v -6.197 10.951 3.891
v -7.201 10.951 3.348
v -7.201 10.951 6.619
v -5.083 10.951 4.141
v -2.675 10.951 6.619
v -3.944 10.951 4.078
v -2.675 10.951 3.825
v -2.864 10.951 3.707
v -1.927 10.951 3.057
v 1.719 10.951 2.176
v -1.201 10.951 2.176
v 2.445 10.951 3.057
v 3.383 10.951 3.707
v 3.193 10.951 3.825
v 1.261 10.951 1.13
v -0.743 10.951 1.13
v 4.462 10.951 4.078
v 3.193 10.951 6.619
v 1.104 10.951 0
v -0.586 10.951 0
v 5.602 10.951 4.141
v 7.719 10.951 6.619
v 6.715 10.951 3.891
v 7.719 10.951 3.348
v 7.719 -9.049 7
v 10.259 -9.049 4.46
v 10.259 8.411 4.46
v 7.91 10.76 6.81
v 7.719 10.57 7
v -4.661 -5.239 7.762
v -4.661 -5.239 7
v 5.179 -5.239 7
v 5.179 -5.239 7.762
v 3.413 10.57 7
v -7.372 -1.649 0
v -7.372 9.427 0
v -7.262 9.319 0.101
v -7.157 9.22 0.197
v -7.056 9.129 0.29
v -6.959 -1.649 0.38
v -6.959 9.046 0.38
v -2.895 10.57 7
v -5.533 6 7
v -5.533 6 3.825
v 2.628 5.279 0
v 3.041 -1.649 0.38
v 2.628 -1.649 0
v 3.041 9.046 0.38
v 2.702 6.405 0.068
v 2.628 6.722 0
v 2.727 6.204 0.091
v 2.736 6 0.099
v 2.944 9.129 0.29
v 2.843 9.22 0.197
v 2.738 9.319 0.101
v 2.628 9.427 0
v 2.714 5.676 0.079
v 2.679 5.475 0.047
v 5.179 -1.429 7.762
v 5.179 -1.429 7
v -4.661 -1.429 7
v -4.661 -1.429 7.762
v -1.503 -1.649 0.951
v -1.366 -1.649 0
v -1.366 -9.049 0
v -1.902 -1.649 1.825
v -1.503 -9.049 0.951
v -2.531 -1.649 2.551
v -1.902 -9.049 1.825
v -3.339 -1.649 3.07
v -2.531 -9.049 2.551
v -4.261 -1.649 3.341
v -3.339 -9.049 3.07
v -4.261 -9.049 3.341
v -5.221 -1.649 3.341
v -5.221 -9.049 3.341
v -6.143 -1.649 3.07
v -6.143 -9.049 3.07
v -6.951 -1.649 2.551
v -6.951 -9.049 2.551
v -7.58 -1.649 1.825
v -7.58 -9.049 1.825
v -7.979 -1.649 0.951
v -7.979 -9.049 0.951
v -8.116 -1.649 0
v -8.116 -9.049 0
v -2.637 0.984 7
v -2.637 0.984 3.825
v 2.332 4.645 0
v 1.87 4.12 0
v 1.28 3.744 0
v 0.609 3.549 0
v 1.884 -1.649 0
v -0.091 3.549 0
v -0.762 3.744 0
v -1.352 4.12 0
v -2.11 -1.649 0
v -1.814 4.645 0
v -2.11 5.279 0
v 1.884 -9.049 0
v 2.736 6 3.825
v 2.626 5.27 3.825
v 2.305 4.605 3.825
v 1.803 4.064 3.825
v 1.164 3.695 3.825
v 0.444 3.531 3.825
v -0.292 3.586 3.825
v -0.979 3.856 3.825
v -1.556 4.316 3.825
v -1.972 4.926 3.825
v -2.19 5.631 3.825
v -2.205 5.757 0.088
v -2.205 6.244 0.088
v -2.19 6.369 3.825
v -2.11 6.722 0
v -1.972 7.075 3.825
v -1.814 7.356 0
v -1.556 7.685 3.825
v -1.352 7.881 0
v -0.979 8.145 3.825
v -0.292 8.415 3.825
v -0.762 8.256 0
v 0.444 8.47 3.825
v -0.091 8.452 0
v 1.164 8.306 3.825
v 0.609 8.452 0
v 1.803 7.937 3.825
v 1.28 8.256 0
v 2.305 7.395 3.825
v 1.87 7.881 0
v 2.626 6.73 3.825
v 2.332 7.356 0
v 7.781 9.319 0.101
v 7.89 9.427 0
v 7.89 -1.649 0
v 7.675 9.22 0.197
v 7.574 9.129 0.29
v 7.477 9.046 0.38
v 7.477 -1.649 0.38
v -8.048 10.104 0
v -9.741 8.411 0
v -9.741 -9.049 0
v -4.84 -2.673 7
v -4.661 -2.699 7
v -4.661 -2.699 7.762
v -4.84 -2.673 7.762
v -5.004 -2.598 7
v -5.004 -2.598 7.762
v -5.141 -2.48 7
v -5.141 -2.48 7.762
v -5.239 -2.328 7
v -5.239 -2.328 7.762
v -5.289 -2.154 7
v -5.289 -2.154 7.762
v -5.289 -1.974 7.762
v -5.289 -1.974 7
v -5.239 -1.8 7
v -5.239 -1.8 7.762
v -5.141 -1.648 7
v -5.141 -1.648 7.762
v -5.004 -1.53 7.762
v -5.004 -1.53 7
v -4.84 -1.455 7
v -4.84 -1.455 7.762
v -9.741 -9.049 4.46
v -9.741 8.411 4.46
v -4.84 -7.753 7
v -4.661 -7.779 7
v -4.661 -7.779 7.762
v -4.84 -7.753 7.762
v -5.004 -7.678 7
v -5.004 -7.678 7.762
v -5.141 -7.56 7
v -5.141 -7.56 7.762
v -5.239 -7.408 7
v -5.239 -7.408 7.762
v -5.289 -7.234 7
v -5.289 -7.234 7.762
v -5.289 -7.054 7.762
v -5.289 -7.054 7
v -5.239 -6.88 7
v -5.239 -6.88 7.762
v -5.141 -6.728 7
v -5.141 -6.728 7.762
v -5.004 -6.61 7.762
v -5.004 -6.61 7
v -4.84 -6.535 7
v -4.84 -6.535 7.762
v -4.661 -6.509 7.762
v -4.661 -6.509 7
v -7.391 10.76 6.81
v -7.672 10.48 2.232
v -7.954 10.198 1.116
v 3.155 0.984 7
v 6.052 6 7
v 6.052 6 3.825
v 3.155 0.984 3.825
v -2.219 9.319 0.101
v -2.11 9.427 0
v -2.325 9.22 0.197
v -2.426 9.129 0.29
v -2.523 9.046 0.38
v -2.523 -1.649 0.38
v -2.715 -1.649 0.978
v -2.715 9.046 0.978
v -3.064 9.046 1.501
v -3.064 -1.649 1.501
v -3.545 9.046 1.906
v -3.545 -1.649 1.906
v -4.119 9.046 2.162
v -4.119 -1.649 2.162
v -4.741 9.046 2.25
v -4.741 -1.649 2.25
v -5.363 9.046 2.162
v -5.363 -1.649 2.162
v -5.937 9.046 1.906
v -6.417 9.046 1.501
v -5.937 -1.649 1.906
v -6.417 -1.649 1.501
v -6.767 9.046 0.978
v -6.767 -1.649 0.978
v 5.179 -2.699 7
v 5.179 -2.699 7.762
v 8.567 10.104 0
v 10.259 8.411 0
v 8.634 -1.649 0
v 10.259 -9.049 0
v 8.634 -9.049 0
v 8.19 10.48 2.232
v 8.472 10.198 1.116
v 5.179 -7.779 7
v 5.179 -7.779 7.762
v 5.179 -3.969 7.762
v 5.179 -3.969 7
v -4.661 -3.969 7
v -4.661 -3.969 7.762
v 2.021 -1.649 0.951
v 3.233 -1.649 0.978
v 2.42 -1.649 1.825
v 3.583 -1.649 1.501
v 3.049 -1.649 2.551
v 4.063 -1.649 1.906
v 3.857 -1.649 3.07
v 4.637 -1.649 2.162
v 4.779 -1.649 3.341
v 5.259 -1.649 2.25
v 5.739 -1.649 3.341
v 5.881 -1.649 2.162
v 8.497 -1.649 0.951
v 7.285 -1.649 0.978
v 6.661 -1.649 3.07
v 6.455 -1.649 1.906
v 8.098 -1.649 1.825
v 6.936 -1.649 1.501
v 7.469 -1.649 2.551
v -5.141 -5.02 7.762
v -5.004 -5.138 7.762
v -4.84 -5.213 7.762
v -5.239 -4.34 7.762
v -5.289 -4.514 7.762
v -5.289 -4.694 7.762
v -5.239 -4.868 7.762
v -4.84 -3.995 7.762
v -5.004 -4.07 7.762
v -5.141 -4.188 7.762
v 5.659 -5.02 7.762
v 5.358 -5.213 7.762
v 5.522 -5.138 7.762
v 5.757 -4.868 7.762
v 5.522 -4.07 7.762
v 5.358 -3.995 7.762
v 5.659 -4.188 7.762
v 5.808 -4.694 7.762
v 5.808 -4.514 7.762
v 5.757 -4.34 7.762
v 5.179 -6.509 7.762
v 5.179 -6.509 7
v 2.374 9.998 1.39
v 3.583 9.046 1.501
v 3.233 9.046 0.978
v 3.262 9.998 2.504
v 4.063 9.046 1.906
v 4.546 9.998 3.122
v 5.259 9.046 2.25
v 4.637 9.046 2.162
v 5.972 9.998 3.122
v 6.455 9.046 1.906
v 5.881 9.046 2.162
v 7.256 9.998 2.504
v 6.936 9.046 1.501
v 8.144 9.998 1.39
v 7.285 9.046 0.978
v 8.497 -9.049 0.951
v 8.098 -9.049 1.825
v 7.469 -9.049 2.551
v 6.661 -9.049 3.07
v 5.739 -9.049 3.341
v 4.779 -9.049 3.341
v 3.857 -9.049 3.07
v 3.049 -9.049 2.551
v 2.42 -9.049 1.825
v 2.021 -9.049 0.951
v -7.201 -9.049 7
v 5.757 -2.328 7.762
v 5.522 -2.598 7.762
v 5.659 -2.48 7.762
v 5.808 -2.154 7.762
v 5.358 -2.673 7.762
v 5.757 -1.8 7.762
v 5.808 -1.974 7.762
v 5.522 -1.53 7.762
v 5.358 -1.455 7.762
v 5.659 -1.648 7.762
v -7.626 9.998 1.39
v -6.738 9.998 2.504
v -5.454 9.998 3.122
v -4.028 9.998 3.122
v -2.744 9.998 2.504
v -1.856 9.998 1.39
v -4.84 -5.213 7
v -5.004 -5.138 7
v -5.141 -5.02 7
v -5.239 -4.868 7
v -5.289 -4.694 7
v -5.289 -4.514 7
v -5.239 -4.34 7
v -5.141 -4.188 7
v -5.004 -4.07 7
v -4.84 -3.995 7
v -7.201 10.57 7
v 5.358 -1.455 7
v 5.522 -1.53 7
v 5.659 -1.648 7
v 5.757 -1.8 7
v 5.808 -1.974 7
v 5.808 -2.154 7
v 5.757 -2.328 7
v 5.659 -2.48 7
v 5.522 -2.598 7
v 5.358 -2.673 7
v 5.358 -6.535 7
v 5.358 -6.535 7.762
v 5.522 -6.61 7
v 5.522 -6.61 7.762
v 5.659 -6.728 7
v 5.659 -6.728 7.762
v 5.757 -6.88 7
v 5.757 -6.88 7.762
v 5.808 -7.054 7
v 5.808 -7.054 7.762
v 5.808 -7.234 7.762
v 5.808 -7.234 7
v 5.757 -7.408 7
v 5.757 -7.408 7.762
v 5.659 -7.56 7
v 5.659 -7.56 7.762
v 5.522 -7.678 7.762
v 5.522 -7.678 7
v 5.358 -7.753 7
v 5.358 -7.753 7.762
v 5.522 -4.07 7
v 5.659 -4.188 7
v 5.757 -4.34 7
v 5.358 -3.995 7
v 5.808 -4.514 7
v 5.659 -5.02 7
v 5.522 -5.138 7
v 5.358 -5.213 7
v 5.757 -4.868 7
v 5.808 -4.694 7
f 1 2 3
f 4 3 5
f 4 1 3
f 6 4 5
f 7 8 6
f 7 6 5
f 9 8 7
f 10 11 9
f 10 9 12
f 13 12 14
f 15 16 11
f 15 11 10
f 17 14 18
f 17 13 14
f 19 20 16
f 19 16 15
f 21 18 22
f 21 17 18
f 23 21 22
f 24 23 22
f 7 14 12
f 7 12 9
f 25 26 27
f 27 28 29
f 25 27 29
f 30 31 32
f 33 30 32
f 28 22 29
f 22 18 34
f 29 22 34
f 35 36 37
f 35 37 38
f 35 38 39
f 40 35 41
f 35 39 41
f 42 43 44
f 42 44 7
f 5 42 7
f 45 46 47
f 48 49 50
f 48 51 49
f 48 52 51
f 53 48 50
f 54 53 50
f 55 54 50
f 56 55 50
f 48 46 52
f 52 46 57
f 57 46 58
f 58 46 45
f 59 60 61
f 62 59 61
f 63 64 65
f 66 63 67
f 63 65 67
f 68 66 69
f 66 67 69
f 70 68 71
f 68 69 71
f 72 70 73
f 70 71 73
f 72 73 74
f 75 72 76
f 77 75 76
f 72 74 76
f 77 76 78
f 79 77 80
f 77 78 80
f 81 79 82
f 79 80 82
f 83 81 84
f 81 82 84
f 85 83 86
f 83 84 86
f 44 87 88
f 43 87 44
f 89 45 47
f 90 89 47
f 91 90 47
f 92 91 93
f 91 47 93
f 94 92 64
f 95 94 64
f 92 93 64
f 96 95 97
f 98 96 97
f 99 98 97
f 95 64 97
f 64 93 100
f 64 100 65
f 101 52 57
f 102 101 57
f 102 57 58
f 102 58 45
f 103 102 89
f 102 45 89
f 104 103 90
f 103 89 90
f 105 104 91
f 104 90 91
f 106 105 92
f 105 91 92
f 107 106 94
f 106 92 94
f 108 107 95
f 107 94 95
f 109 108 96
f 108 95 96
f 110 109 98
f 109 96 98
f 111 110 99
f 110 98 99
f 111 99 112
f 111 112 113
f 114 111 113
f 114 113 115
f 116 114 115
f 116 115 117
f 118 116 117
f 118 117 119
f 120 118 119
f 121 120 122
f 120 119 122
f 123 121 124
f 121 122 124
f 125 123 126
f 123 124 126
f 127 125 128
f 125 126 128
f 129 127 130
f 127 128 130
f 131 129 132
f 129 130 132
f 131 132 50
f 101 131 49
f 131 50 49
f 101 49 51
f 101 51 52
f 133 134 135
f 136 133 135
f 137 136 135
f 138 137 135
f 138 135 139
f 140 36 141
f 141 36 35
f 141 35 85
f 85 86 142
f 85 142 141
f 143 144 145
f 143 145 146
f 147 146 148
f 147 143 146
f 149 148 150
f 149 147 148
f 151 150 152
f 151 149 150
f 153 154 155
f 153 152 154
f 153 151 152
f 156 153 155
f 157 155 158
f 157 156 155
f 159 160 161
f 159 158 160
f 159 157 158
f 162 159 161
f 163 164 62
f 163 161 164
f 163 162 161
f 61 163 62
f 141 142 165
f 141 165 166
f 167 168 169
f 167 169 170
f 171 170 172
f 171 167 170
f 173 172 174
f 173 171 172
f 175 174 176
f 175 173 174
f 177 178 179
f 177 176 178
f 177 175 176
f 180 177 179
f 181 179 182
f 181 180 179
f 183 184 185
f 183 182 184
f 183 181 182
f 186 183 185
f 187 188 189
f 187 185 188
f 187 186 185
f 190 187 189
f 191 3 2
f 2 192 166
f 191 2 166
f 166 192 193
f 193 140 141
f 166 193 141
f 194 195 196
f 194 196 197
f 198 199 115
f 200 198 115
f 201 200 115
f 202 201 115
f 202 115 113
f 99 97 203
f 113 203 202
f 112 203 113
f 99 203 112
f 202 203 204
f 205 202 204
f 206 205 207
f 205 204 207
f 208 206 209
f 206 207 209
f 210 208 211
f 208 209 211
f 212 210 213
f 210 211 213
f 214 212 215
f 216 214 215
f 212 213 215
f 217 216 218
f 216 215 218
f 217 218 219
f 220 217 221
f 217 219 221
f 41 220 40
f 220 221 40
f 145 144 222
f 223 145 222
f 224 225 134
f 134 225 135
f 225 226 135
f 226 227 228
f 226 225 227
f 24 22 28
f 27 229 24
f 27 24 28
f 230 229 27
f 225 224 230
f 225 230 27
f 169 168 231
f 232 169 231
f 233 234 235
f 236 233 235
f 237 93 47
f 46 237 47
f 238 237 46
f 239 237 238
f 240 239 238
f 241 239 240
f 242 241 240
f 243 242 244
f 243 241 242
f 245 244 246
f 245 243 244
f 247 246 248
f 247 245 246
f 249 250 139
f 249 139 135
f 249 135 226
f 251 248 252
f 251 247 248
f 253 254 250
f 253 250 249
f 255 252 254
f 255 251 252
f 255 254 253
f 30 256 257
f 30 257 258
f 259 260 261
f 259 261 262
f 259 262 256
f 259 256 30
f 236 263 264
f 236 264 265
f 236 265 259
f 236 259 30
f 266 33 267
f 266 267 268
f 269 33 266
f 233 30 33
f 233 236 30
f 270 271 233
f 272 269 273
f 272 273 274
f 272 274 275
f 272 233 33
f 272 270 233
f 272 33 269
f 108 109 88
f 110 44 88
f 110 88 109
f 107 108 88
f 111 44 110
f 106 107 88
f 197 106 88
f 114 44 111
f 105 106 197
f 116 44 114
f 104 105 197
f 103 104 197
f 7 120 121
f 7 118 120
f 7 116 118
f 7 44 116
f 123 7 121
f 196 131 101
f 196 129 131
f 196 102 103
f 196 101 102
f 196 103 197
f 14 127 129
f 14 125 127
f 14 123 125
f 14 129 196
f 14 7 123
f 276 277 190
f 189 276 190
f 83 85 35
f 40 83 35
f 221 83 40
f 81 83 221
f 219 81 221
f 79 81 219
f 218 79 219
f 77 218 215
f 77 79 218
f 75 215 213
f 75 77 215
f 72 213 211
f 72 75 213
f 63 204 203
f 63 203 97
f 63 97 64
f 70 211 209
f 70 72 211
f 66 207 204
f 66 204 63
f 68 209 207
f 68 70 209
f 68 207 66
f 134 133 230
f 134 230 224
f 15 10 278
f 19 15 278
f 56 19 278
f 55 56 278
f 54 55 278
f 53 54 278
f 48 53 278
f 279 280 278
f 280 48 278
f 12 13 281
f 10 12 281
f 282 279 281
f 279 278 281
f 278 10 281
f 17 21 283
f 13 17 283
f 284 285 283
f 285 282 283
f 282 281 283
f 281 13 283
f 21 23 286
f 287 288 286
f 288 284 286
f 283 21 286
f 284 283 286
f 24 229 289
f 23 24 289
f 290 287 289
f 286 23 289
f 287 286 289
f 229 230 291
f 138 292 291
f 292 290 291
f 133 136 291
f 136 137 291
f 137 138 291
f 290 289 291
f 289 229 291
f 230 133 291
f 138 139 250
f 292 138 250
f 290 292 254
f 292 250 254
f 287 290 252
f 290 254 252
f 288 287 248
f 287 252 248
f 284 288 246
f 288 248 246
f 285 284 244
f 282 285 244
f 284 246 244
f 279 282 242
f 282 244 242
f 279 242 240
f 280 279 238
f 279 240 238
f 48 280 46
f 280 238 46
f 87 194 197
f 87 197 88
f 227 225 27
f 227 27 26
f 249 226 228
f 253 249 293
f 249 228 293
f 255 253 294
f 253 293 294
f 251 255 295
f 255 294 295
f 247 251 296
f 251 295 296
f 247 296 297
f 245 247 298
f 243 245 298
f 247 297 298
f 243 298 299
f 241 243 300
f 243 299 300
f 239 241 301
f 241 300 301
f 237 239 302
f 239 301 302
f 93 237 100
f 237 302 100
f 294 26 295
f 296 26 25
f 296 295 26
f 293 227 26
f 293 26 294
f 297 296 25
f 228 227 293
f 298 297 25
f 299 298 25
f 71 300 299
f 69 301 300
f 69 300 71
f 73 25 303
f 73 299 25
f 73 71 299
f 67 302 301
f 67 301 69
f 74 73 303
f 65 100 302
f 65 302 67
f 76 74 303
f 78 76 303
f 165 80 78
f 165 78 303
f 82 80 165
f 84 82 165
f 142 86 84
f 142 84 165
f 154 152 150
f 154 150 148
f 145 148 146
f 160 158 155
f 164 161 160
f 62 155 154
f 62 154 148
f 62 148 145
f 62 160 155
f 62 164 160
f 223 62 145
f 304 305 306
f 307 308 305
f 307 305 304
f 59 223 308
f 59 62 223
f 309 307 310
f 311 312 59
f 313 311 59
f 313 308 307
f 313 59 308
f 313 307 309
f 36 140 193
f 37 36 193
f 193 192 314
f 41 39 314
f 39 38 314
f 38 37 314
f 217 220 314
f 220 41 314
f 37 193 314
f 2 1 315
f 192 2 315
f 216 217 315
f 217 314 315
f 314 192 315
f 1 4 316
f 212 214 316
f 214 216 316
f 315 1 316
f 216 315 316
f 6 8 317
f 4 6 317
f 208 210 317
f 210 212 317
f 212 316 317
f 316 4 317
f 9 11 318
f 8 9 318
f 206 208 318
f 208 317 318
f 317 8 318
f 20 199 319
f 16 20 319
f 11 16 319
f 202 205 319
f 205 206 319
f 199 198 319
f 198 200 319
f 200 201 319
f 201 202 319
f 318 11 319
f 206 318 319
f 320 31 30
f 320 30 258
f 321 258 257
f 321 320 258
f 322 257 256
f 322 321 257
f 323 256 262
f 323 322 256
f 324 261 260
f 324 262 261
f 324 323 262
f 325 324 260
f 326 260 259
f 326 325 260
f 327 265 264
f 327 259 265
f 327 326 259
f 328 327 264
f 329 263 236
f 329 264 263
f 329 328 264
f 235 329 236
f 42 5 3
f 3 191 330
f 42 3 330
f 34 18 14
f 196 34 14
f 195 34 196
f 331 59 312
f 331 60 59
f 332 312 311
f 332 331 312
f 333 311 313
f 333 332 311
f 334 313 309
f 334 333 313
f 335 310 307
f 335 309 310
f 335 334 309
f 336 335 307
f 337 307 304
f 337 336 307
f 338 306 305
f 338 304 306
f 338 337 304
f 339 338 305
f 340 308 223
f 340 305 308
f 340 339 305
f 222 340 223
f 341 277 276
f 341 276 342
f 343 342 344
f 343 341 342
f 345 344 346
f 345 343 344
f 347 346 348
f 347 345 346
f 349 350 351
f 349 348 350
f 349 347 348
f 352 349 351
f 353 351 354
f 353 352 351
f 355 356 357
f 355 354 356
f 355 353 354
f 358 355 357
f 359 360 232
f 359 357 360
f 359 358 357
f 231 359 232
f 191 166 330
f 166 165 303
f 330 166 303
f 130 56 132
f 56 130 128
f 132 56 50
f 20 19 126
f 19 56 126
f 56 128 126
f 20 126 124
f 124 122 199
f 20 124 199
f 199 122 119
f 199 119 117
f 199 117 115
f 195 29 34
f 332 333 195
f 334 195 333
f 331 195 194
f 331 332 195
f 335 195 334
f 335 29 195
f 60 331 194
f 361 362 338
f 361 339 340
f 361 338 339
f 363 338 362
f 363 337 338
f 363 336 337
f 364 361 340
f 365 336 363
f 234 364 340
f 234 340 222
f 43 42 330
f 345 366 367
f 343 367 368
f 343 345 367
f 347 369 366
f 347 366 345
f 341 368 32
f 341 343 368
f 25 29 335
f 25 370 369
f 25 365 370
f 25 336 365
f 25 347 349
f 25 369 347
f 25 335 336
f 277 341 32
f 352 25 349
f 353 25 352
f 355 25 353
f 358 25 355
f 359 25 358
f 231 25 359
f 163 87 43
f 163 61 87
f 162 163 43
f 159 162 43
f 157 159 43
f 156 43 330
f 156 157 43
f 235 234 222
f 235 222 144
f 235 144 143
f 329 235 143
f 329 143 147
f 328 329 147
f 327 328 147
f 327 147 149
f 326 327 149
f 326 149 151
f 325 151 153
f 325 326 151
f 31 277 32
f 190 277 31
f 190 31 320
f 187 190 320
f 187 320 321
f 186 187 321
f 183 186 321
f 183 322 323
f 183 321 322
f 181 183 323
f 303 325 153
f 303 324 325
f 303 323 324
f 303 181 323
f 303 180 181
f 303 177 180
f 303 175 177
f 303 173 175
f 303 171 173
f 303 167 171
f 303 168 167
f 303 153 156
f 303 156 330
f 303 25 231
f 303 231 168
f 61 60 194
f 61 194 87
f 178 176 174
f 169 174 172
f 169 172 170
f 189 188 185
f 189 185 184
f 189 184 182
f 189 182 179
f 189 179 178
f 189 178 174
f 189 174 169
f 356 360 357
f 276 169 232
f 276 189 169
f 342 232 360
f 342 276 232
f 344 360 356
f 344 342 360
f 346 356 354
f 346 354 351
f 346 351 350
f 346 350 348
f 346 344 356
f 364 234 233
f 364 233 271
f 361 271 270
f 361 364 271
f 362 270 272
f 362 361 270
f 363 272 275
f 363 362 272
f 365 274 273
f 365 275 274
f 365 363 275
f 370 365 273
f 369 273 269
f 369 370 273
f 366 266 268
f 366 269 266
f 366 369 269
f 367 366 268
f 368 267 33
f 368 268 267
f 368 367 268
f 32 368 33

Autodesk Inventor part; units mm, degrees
ref_plane "YZ Plane" through (0, 0, 0) normal (1, 0, 0) x (0, 1, 0)
ref_plane "XZ Plane" through (0, 0, 0) normal (0, 1, 0) x (-1, 0, 0)
ref_plane "XY Plane" through (0, 0, 0) normal (0, 0, 1) x (1, 0, 0)
sketch "Sketch1" plane through (0, 0, 0) normal (0, 1, 0) x (-1, 0, 0)
  line L0 (-10.2591, 9.049) -> (9.7409, 9.049)
  line L1 (9.7409, 9.049) -> (9.7409, -10.951)
  line L2 (9.7409, -10.951) -> (-10.2591, -10.951)
  line L3 (-10.2591, -10.951) -> (-10.2591, 9.049)
  point P0 (0, 0)
  dimension "d0" = 20
  dimension "d1" = 20
extrude "Extrusion1" add sketch "Sketch1" along normal blind 7
sketch "Sketch2" plane through (-9.7409, 0, 9.049) normal (0, 0, 1) x (1, 0, 0)
  line L0 (20, 0) -> (0, 0) projected
  line L1 (20, 0) -> (20, 7) projected
  line L2 (0, 0) -> (0, 7) projected
  circle A0 centre (15, 0) radius 3.375
  circle A1 centre (5, 0) radius 3.375
  point P0 (9.7409, 0)
  dimension "d4" = 6.75
  dimension "d5" = 6.75
  dimension "d6" = 5
  dimension "d7" = 5
  dimension "d32" = 10
extrude "Extrusion2" cut sketch "Sketch2" against normal blind 7.4
sketch "Sketch3" plane through (-9.7409, 0, 1.649) normal (0, 0, 1) x (1, 0, 0)
  arc A0 (8.375, 0) -> (1.625, 0) centre (5, 0) ccw projected
  line L0 (18.375, 0) -> (11.625, 0) projected
  arc A1 (18.375, 0) -> (11.625, 0) centre (15, 0) ccw projected
  circle A2 centre (15, 0) radius 2.25
  circle A3 centre (5, 0) radius 2.25
  point P0 (9.7409, 0)
  dimension "d10" = 4.5
  dimension "d11" = 4.5
extrude "Extrusion3" cut sketch "Sketch3" against normal through all contours A2 L0 | L0 A2 | A3
sketch "Sketch4" plane through (0, 0, 0) normal (0, -1, 0) x (1, 0, 0)
  line L0 (-2.4909, 1.649) -> (-2.4909, -10.951) projected
  line L1 (3.0091, -10.951) -> (3.0091, 1.649) projected
  circle A0 centre (0.2591, -6.0003) radius 2.4765
  point P0 (0, 0)
  dimension "d14" = 4.953
  dimension "d15" = 5.5
  dimension "d16" = 2.75
extrude "Extrusion4" cut sketch "Sketch4" against normal through all
chamfer "Chamfer1" distance 1.905 angle 45 2 edges at (5.2591, 2.25, -10.951) (-4.7409, 2.25, -10.951)
chamfer "Chamfer2" distance 0.381 angle 45 5 edges at (-2.4909, 0, -3.6985) (-6.9909, 0, -3.6985) (7.5091, 0, -3.6985) (3.0091, 0, -3.6985) (0.2591, 7, -10.951)
chamfer "Chamfer3" distance 2.54 angle 45 4 edges at (-9.7409, 7, -0.7605) (10.2591, 7, -0.7605) (-9.7409, 3.3095, -10.951) (10.2591, 3.3095, -10.951)
sketch "Sketch5" plane through (0, 7, 0) normal (0, 1, 0) x (1, 0, 0)
  line L0 (-7.2009, 10.57) -> (7.7191, 10.57) projected
  circle A0 centre (0.2591, 6.0003) radius 2.4765 projected
  line L1 (3.1554, 0.9838) -> (-2.6371, 0.9838)
  line L2 (-2.6371, 0.9838) -> (-5.5334, 6.0003)
  line L3 (-5.5334, 6.0003) -> (-2.6371, 11.0168)
  line L4 (-2.6371, 11.0168) -> (3.1554, 11.0168)
  line L5 (3.1554, 11.0168) -> (6.0517, 6.0003)
  line L6 (6.0517, 6.0003) -> (3.1554, 0.9838)
  point P0 (0, 0)
  dimension "d29" = 10.033
extrude "Extrusion5" cut sketch "Sketch5" against normal blind 3.175
sketch "Sketch6" plane through (0, 7, 0) normal (0, 1, 0) x (1, 0, 0)
  line L0 (-7.2009, -9.049) -> (-7.2009, 10.57) projected
  line L1 (-7.2009, -9.049) -> (7.7191, -9.049) projected
  line L2 (7.7191, 10.57) -> (7.7191, -9.049) projected
  line L3 (3.4133, 10.57) -> (7.7191, 10.57) projected
  line L4 (-4.6609, -7.144) -> (5.1791, -7.144) construction
  line L5 (-4.6609, -7.779) -> (5.1791, -7.779)
  line L6 (5.1791, -6.509) -> (-4.6609, -6.509)
  arc A0 (-4.6609, -6.509) -> (-4.6609, -7.779) centre (-4.6609, -7.144) ccw
  arc A1 (5.1791, -7.779) -> (5.1791, -6.509) centre (5.1791, -7.144) ccw
  line L7 (-4.6609, -5.239) -> (5.1791, -5.239)
  line L8 (5.1791, -3.969) -> (-4.6609, -3.969)
  arc A2 (-4.6609, -3.969) -> (-4.6609, -5.239) centre (-4.6609, -4.604) ccw
  arc A3 (5.1791, -5.239) -> (5.1791, -3.969) centre (5.1791, -4.604) ccw
  line L9 (-4.6609, -2.699) -> (5.1791, -2.699)
  line L10 (5.1791, -1.429) -> (-4.6609, -1.429)
  arc A4 (-4.6609, -1.429) -> (-4.6609, -2.699) centre (-4.6609, -2.064) ccw
  arc A5 (5.1791, -2.699) -> (5.1791, -1.429) centre (5.1791, -2.064) ccw
  point P0 (0, 0)
  point P1 (0.2591, -7.144)
  dimension "d33" = 1.27
  dimension "d34" = 2.54
  dimension "d35" = 2.54
  dimension "d36" = 1.905
  dimension "d39" = 2.54
extrude "Extrusion6" add sketch "Sketch6" along normal blind 0.762
move or copy body "Move Body1" bodies to move or copy 1 copy no rotation origin (0, 0, 0) rotation axis (1, 0, 0) rotation angle 90
equation "\"d16\" = 0.5 * d15"
properties part number "key_half"
